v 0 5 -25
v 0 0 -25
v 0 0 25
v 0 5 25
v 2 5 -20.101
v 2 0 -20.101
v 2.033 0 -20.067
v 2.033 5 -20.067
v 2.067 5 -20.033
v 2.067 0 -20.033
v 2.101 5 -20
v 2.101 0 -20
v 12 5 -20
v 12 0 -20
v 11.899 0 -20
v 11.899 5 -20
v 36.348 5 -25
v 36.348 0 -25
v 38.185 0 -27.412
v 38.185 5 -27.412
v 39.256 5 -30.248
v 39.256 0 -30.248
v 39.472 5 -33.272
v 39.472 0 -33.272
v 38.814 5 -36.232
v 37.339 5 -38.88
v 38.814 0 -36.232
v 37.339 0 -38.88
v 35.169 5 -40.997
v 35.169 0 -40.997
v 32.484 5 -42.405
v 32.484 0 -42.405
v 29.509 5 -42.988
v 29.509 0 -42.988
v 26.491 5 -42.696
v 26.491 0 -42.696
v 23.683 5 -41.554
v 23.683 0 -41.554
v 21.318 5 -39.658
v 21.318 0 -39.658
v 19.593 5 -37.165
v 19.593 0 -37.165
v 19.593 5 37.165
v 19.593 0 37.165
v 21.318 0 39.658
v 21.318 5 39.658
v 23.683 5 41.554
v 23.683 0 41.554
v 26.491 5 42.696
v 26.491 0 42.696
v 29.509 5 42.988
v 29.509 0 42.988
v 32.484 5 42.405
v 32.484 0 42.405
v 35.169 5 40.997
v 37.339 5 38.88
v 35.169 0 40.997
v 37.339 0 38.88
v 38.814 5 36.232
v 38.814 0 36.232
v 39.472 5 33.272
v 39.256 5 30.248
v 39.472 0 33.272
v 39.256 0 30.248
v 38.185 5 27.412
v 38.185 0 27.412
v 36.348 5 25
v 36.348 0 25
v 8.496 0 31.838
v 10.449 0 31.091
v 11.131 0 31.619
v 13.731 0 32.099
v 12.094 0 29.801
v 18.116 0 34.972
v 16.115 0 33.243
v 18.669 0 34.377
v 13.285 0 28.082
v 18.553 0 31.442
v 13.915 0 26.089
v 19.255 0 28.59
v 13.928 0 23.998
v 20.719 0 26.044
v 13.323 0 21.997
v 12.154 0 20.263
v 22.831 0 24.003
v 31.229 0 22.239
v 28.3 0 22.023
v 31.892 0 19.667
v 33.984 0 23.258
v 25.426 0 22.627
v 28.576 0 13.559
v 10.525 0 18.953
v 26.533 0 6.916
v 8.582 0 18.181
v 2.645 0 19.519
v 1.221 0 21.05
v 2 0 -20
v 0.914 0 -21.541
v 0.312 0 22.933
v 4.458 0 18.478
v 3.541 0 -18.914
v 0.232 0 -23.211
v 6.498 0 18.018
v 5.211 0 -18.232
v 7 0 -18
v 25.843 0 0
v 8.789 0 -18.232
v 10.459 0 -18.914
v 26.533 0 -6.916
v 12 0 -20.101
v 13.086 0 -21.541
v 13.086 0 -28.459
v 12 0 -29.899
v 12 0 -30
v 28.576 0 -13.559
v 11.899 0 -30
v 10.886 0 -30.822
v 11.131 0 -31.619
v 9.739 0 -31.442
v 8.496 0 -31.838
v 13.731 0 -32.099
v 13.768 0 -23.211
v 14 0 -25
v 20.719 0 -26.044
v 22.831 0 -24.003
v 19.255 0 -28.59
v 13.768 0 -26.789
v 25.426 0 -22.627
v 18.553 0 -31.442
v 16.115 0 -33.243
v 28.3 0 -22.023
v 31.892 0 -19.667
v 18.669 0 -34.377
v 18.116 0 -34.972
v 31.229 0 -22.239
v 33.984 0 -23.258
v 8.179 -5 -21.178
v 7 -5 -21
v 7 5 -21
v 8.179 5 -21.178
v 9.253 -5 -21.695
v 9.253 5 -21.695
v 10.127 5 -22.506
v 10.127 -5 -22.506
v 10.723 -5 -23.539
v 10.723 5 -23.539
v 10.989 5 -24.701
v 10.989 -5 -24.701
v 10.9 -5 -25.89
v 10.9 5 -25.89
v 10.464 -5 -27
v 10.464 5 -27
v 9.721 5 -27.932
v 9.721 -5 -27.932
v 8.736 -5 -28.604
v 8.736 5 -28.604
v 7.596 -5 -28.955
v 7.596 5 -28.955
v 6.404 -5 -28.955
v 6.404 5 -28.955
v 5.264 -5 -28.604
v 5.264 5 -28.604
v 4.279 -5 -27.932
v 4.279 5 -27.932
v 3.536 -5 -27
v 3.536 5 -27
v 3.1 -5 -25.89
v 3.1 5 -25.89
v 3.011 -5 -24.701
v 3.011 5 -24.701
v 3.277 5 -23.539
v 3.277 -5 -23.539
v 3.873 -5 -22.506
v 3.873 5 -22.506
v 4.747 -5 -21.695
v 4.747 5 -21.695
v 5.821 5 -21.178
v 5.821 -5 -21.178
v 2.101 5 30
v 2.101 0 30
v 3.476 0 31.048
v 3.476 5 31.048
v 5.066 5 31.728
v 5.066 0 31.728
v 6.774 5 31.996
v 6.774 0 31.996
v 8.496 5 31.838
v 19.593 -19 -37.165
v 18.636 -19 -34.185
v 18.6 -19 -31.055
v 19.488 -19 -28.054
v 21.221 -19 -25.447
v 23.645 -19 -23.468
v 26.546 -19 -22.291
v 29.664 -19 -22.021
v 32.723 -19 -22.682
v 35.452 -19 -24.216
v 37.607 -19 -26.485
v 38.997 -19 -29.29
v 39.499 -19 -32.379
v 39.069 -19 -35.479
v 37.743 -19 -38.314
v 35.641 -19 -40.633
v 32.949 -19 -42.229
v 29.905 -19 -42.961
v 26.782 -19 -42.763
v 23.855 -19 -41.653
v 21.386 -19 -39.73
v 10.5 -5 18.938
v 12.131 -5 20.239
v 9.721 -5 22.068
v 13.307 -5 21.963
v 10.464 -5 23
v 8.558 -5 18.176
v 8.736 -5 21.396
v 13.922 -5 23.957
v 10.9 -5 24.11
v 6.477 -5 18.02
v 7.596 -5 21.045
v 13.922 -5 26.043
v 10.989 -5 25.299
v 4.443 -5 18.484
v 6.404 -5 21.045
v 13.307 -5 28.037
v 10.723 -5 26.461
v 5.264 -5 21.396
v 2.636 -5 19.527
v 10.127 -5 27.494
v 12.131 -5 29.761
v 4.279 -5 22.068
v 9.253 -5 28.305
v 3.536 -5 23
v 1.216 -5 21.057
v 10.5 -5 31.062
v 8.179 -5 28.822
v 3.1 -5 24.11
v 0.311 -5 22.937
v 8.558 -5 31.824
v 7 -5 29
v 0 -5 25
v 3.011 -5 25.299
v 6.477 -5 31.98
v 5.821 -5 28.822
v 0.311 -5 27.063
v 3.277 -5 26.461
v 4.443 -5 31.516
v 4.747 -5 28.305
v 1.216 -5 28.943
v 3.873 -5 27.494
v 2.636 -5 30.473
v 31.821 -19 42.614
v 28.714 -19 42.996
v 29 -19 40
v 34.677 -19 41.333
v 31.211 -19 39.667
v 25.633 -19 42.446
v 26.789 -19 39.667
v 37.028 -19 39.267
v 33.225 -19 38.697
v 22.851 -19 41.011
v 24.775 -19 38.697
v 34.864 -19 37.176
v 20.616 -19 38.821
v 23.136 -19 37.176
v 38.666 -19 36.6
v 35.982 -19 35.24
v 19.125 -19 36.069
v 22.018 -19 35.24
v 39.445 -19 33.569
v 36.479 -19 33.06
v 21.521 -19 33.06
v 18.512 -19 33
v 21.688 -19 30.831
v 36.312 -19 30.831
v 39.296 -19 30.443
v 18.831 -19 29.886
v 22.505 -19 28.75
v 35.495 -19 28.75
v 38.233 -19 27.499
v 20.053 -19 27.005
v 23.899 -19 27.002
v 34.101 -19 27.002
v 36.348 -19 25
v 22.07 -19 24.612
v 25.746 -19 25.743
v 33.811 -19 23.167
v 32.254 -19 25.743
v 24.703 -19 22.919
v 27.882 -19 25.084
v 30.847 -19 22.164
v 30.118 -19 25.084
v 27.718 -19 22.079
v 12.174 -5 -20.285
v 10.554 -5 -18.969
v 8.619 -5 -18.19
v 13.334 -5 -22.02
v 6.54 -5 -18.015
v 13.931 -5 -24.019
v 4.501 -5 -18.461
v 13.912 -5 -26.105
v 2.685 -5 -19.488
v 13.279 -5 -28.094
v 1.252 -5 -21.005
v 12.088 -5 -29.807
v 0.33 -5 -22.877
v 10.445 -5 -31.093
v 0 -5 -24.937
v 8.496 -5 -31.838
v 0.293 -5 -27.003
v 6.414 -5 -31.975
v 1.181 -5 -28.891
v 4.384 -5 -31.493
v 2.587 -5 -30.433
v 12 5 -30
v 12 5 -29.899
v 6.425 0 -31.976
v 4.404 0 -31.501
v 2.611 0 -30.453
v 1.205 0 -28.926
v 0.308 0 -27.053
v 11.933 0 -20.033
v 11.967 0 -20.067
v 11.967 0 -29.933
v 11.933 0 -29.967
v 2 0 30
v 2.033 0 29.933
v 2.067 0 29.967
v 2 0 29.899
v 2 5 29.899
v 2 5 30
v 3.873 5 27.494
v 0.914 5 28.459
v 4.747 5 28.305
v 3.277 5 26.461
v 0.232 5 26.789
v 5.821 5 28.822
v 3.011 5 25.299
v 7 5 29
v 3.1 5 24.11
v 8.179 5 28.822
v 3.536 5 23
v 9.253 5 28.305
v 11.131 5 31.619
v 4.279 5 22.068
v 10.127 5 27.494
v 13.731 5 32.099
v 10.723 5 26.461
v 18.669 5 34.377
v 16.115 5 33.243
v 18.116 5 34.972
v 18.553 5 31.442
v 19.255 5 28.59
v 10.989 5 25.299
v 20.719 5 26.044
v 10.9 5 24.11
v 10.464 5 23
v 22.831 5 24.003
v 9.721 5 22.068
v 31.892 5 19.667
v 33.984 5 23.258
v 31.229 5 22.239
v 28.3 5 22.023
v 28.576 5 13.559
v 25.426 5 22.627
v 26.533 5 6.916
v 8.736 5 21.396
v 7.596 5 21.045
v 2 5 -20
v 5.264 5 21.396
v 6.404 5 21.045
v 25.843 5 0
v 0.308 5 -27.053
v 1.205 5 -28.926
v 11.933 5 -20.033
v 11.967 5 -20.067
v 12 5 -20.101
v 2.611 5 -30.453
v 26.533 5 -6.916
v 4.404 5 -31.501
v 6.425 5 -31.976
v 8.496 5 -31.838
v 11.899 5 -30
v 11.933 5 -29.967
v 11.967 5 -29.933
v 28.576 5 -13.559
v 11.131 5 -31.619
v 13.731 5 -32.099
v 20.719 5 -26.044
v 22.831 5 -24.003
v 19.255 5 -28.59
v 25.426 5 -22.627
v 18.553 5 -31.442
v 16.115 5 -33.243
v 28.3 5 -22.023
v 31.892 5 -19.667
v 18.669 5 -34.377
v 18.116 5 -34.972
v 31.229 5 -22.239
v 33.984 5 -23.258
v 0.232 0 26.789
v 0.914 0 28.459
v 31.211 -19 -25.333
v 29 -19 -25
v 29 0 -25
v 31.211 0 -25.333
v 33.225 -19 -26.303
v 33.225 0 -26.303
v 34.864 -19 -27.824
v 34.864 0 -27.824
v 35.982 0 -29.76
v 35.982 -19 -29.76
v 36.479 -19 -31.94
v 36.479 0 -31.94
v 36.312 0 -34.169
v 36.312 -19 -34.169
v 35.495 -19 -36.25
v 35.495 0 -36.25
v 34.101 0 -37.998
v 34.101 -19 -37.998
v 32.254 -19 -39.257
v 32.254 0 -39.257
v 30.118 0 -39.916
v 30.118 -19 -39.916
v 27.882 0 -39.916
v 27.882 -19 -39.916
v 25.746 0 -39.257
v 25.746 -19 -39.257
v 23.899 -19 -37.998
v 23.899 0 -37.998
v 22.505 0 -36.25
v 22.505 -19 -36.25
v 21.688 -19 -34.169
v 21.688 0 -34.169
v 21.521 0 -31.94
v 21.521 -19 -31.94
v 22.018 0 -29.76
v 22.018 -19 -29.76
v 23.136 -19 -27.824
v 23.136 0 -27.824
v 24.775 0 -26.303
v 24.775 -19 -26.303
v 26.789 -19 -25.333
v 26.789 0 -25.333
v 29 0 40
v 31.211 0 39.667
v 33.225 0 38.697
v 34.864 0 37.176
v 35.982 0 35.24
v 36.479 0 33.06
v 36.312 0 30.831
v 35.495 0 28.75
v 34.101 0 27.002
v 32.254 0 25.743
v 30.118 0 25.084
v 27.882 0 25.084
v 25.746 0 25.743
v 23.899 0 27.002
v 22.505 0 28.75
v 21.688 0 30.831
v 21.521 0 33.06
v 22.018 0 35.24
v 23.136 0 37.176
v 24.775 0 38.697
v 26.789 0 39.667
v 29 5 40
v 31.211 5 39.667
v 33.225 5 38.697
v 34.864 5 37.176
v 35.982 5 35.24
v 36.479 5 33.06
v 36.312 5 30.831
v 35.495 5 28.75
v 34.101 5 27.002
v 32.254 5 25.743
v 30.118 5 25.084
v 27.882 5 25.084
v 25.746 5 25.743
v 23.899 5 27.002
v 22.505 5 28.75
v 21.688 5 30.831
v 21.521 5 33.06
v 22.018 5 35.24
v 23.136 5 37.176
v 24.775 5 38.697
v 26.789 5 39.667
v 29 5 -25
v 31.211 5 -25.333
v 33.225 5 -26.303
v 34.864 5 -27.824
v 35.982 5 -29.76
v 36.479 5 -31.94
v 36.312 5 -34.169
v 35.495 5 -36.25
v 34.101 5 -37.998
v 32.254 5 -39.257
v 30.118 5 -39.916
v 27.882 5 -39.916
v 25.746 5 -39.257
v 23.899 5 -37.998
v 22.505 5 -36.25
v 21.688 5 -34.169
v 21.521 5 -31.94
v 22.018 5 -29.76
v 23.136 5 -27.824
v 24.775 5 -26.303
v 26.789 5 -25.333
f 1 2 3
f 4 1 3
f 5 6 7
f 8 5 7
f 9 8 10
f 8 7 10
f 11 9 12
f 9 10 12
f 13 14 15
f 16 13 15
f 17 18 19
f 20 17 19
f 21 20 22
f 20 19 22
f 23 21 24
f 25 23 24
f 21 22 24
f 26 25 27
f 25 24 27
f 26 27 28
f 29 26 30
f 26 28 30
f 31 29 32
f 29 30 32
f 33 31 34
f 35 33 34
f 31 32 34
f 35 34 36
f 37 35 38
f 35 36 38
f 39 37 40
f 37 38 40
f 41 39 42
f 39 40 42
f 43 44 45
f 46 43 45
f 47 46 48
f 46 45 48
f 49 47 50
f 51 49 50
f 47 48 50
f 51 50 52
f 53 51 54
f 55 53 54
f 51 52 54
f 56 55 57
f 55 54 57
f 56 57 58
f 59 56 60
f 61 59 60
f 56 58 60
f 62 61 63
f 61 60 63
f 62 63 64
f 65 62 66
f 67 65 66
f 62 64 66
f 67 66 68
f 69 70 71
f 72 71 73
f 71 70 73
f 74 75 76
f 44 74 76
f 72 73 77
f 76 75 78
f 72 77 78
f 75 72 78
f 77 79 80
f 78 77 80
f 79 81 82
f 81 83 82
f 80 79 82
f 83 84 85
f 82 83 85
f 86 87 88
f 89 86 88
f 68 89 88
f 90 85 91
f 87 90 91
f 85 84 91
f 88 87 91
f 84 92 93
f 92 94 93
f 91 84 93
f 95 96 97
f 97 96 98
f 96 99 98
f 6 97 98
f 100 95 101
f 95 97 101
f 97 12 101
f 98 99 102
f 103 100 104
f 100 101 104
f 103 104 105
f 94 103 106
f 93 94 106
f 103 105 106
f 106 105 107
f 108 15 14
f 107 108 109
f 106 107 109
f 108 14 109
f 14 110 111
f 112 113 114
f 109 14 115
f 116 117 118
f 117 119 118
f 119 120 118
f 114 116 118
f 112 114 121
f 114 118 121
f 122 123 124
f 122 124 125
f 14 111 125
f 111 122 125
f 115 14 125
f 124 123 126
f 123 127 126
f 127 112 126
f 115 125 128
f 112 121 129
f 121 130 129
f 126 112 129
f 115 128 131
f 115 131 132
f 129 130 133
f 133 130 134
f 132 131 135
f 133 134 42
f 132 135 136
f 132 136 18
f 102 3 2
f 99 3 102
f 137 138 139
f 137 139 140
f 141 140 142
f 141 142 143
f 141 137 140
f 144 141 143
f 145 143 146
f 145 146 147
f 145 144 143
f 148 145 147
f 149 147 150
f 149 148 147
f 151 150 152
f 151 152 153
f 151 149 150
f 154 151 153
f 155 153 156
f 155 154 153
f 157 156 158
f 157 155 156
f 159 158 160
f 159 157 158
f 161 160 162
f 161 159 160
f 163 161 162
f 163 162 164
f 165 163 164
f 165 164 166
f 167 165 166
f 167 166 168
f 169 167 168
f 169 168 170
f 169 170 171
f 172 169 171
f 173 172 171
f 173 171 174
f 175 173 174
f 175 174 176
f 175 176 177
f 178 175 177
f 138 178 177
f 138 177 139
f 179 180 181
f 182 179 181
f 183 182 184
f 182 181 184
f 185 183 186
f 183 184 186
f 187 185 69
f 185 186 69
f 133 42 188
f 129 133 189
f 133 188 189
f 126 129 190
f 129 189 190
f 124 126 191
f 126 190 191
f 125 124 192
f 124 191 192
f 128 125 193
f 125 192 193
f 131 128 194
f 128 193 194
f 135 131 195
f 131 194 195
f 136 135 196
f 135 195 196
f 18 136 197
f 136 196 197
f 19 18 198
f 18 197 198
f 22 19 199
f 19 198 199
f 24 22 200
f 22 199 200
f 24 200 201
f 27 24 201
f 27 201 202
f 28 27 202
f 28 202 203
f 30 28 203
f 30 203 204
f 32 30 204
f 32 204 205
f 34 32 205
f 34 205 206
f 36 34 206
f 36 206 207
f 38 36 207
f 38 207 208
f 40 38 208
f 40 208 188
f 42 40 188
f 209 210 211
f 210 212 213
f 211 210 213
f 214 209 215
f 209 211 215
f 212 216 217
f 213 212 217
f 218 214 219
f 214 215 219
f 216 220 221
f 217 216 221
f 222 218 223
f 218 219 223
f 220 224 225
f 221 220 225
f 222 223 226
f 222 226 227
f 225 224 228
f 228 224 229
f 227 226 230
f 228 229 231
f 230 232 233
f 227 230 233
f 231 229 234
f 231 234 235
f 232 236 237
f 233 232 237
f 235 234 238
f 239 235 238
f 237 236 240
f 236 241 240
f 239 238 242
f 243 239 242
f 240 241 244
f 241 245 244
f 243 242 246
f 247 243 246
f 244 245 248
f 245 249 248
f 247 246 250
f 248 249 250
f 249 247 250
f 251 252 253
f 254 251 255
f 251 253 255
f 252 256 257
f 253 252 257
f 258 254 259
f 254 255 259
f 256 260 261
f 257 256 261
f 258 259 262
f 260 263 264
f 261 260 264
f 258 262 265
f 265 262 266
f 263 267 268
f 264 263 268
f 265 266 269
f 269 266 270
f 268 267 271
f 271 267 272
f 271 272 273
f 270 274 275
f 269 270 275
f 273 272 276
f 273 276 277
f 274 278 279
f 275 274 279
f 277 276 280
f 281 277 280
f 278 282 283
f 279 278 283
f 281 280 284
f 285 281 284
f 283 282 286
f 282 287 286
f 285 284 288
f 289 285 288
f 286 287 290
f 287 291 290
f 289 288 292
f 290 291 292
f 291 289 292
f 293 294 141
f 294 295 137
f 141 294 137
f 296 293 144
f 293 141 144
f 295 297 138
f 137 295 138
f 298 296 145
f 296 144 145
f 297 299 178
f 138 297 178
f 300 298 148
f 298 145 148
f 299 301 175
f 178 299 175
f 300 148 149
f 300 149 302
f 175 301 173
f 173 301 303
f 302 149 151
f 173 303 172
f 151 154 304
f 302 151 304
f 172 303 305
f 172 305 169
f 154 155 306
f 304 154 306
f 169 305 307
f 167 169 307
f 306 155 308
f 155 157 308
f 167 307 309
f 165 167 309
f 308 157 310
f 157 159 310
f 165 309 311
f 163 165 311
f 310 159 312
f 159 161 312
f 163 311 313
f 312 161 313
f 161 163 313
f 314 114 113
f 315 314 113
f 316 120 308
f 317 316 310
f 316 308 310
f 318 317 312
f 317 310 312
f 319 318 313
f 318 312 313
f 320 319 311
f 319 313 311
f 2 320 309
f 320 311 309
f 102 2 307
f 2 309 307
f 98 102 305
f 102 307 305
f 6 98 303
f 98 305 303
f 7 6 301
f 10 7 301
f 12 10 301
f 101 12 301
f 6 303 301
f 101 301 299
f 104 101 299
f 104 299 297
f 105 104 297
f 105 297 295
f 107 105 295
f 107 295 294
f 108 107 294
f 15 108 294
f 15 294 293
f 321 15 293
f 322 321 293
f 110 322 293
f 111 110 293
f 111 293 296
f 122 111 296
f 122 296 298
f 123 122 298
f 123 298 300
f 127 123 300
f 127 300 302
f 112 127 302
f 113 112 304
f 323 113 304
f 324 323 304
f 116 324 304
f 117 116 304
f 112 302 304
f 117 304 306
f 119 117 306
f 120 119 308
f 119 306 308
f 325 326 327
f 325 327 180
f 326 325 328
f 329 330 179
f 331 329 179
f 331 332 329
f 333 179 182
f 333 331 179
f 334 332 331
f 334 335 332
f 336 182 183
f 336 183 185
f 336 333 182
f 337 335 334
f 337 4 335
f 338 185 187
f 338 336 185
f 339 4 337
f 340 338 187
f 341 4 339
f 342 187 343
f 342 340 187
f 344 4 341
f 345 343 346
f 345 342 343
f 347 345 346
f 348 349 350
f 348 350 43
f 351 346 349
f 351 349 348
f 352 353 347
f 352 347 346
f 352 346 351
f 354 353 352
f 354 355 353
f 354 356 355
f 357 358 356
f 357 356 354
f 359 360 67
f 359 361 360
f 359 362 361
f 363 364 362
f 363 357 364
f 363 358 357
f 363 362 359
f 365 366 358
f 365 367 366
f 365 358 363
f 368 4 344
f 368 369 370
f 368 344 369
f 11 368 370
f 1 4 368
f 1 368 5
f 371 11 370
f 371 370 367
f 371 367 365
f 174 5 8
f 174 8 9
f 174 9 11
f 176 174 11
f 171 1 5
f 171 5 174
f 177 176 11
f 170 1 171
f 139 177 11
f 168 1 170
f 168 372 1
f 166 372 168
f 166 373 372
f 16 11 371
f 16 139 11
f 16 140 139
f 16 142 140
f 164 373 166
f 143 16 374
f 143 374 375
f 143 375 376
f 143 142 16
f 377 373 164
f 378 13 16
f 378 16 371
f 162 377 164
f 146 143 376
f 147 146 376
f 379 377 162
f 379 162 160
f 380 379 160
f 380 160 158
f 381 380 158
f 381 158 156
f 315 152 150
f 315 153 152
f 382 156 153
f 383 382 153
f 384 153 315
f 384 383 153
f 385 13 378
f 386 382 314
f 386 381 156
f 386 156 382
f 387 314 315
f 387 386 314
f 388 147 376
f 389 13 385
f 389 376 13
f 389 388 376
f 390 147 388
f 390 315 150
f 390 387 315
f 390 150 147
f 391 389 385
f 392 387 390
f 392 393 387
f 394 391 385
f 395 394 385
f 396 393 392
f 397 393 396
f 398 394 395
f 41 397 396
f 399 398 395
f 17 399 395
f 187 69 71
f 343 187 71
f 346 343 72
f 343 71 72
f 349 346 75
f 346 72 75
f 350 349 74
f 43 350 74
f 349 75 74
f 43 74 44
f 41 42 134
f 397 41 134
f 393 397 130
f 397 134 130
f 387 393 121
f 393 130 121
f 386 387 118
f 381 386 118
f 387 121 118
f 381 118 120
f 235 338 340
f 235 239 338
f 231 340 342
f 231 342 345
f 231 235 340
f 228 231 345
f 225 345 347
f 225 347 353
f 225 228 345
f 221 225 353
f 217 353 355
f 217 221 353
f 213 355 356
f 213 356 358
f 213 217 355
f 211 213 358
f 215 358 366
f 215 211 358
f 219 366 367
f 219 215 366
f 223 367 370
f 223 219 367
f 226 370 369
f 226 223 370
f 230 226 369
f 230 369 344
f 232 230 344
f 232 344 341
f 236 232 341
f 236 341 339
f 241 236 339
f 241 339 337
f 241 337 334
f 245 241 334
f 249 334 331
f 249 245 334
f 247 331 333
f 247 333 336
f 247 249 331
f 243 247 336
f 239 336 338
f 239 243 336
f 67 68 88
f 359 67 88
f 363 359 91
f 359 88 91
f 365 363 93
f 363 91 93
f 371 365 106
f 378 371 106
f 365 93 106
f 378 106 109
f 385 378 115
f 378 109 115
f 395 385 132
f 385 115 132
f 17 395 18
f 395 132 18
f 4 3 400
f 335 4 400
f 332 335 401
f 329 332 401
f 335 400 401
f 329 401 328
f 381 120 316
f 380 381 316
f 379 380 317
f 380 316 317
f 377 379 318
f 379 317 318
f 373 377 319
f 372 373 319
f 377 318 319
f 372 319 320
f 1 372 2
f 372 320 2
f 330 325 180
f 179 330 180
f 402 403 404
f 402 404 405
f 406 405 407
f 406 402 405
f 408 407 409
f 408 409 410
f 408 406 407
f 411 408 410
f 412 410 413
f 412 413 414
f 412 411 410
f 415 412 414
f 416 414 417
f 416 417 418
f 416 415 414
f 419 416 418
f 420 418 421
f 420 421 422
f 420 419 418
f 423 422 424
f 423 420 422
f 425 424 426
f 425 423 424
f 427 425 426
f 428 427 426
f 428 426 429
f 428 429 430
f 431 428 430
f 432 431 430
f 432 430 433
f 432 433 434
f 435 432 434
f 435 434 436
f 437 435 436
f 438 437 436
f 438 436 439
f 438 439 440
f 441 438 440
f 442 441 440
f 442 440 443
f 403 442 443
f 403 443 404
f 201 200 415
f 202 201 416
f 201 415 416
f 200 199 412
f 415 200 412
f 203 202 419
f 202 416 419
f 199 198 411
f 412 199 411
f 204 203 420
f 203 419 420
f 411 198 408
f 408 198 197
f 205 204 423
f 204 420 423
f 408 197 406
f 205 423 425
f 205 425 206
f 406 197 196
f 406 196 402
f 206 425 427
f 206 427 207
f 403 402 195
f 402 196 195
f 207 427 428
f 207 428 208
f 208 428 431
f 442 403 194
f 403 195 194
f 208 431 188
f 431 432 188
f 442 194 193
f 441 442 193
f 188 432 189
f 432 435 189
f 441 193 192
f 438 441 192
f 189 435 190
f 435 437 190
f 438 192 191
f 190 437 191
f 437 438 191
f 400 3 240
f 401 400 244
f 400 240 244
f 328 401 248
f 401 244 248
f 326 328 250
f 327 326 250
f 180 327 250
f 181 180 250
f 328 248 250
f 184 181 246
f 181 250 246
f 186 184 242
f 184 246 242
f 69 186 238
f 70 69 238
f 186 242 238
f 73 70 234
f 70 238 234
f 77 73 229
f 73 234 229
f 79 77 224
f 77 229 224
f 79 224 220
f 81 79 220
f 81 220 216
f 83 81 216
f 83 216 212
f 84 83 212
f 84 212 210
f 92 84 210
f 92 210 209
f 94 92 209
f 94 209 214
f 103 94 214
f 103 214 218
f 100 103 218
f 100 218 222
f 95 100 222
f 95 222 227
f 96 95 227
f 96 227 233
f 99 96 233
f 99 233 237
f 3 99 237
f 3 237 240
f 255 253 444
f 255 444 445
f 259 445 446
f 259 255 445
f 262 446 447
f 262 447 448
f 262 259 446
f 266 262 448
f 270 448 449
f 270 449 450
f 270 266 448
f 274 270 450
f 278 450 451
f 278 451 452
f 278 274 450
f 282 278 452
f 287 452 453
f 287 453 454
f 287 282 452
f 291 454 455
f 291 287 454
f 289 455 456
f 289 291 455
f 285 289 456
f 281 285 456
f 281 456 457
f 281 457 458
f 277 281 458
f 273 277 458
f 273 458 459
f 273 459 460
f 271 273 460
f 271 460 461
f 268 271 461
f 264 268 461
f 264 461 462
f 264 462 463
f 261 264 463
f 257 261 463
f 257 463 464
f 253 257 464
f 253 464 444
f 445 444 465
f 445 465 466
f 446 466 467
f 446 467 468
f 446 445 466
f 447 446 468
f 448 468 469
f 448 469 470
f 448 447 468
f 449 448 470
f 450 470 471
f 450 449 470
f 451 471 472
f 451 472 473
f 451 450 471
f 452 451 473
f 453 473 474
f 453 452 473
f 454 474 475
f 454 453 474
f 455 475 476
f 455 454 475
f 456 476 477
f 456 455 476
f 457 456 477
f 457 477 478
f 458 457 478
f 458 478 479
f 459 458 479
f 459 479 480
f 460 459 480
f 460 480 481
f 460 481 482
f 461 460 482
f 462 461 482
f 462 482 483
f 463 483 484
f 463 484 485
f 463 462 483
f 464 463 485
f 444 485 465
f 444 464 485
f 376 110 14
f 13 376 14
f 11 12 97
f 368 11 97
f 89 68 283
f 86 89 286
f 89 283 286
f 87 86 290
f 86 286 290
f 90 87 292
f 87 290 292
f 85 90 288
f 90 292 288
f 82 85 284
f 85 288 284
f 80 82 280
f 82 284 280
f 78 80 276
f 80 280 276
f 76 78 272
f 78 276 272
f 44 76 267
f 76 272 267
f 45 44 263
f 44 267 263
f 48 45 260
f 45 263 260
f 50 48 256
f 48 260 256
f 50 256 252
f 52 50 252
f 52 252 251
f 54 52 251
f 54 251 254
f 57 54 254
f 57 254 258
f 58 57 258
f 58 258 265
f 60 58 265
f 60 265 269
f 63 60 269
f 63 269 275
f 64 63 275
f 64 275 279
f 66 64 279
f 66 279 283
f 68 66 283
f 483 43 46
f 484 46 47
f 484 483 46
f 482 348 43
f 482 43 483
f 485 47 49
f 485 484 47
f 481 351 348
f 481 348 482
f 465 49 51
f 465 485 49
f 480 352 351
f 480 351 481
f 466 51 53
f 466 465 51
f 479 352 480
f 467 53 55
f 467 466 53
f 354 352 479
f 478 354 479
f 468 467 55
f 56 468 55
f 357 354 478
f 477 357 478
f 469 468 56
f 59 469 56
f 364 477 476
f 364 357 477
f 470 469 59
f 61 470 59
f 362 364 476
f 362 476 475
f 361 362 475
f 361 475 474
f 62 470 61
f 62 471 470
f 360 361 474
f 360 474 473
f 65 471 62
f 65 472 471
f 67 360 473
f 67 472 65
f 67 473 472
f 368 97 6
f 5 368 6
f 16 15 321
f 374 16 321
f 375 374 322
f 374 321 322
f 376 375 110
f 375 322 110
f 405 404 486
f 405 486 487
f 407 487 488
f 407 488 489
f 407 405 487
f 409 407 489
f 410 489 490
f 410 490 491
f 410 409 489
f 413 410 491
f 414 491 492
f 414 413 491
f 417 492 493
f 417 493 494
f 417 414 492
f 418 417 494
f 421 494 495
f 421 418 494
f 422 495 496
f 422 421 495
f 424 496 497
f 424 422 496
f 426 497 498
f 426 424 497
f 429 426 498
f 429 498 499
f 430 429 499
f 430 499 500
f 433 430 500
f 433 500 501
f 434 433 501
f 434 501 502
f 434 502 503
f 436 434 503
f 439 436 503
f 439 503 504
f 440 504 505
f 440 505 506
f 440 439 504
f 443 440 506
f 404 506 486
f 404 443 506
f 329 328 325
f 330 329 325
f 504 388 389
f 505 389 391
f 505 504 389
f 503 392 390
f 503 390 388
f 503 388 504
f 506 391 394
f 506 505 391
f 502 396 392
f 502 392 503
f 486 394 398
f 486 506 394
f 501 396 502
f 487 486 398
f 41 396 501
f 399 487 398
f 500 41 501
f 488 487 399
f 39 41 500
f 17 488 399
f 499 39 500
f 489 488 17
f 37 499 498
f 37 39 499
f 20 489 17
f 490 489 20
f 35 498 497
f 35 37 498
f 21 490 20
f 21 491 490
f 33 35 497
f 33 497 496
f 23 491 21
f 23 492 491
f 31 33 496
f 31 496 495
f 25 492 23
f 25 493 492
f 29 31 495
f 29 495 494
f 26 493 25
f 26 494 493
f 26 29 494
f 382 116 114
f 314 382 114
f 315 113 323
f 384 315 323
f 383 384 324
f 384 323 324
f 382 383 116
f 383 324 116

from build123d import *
from build123d.topology import SkipClean

# Parameters (mm, degrees)
SKETCH1_R                = 4
SKETCH1_R_2              = 7.5
BOSS_EXTRUDE1_DEPTH      = 5
BOSS_EXTRUDE2_START      = -5
SKETCH1_3_R              = 7
SKETCH1_3_R_2            = 4
BOSS_EXTRUDE2_DEPTH      = 5
BOSS_EXTRUDE3_DEPTH      = 5
BOSS_EXTRUDE3_DEPTH_BACK = 19
SKETCH1_4_R              = 10.5
SKETCH1_4_R_2            = 7.5


with BuildPart() as part:
    # Sketch1 → Boss-Extrude1 (new body)
    with BuildSketch(Plane(origin=(0, 0, 0), x_dir=(1, 0, 0), z_dir=(0, 1, 0))):
        with BuildLine():
            Line((2, -30), (2.101020514, -30))
            ThreePointArc((2.101020514, -30), (5.066288205, -31.727611663), (8.496335544, -31.838200051))
            ThreePointArc((8.496335544, -31.838200051), (14.961261821, -32.591823522), (19.59300275, -37.164590308))
            ThreePointArc((19.59300275, -37.164590308), (35.168768008, -40.996840663), (36.348469228, -25))
            ThreePointArc((36.348469228, -25), (25.843366656, 0), (36.348469228, 25))
            ThreePointArc((36.348469228, 25), (35.168768008, 40.996840663), (19.59300275, 37.164590308))
            ThreePointArc((19.59300275, 37.164590308), (14.961261821, 32.591823522), (8.496335544, 31.838200051))
            ThreePointArc((8.496335544, 31.838200051), (2.611056437, 30.45318021), (0, 25))
            Line((0, 25), (0, -25))
            ThreePointArc((0, -25), (0.519259302, -27.645751311), (2, -29.898979486))
            Line((2, -29.898979486), (2, -30))
        make_face()
        with Locations(Location((7, -25, 0), (0, 0, 270))):
            Circle(SKETCH1_R, mode=Mode.SUBTRACT)
        with BuildLine():
            Line((2, 20), (2, 20.101020514))
            ThreePointArc((2, 20.101020514), (2.050252532, 20.050252532), (2.101020514, 20))
            Line((2.101020514, 20), (2, 20))
        make_face(mode=Mode.SUBTRACT)
        with BuildLine():
            ThreePointArc((11.898979486, 20), (11.949747468, 20.050252532), (12, 20.101020514))
            Line((12, 20.101020514), (12, 20))
            Line((12, 20), (11.898979486, 20))
        make_face(mode=Mode.SUBTRACT)
        with Locations(Location((7, 25, 0), (0, 0, 270))):
            Circle(SKETCH1_R, mode=Mode.SUBTRACT)
        with BuildLine():
            ThreePointArc((12, 29.898979486), (11.949747468, 29.949747468), (11.898979486, 30))
            Line((11.898979486, 30), (12, 30))
            Line((12, 30), (12, 29.898979486))
        make_face(mode=Mode.SUBTRACT)
        with Locations(Location((29, 32.5, 0), (0, 0, 270))):
            Circle(SKETCH1_R_2, mode=Mode.SUBTRACT)
        with Locations(Location((29, -32.5, 0), (0, 0, 270))):
            Circle(SKETCH1_R_2, mode=Mode.SUBTRACT)
    extrude(amount=BOSS_EXTRUDE1_DEPTH)

    # Sketch1<3> → Boss-Extrude2 (add)
    # profile 1 of 2: a face of its own
    with BuildSketch(Plane(origin=(0, 0, 0), x_dir=(1, 0, 0), z_dir=(0, 1, 0)).offset(BOSS_EXTRUDE2_START)):
        with Locations(Location((7, 25, 0), (0, 0, 77.657080359))):
            Circle(SKETCH1_3_R)
        with Locations(Location((7, 25, 0), (0, 0, 270))):
            Circle(SKETCH1_3_R_2, mode=Mode.SUBTRACT)
    # profile 2 of 2: a face of its own
    with BuildSketch(Plane(origin=(0, 0, 0), x_dir=(1, 0, 0), z_dir=(0, 1, 0)).offset(BOSS_EXTRUDE2_START)):
        with Locations(Location((7, -25, 0), (0, 0, 180))):
            Circle(SKETCH1_3_R)
        with Locations(Location((7, -25, 0), (0, 0, 270))):
            Circle(SKETCH1_3_R_2, mode=Mode.SUBTRACT)
    extrude(amount=BOSS_EXTRUDE2_DEPTH)

    # Sketch1<4> → Boss-Extrude3 (add, two sides: drawn at the far end of the back side and taken through both)
    # profile 1 of 2: a face of its own
    with SkipClean():  # the faces are left unmerged after this step: merging them gives an invalid solid
        with BuildSketch(Plane(origin=(0, 0, 0), x_dir=(1, 0, 0), z_dir=(0, 1, 0)).offset(-BOSS_EXTRUDE3_DEPTH_BACK)):
            with Locations(Location((29, 32.5, 0), (0, 0, 153.62484734))):
                Circle(SKETCH1_4_R)
            with Locations(Location((29, 32.5, 0), (0, 0, 270))):
                Circle(SKETCH1_4_R_2, mode=Mode.SUBTRACT)
        # profile 2 of 2: a face of its own
        with BuildSketch(Plane(origin=(0, 0, 0), x_dir=(1, 0, 0), z_dir=(0, 1, 0)).offset(-BOSS_EXTRUDE3_DEPTH_BACK)):
            with Locations(Location((29, -32.5, 0), (0, 0, 45.584691403))):
                Circle(SKETCH1_4_R)
            with Locations(Location((29, -32.5, 0), (0, 0, 270))):
                Circle(SKETCH1_4_R_2, mode=Mode.SUBTRACT)
        extrude(amount=BOSS_EXTRUDE3_DEPTH + BOSS_EXTRUDE3_DEPTH_BACK)


solid = part.part
